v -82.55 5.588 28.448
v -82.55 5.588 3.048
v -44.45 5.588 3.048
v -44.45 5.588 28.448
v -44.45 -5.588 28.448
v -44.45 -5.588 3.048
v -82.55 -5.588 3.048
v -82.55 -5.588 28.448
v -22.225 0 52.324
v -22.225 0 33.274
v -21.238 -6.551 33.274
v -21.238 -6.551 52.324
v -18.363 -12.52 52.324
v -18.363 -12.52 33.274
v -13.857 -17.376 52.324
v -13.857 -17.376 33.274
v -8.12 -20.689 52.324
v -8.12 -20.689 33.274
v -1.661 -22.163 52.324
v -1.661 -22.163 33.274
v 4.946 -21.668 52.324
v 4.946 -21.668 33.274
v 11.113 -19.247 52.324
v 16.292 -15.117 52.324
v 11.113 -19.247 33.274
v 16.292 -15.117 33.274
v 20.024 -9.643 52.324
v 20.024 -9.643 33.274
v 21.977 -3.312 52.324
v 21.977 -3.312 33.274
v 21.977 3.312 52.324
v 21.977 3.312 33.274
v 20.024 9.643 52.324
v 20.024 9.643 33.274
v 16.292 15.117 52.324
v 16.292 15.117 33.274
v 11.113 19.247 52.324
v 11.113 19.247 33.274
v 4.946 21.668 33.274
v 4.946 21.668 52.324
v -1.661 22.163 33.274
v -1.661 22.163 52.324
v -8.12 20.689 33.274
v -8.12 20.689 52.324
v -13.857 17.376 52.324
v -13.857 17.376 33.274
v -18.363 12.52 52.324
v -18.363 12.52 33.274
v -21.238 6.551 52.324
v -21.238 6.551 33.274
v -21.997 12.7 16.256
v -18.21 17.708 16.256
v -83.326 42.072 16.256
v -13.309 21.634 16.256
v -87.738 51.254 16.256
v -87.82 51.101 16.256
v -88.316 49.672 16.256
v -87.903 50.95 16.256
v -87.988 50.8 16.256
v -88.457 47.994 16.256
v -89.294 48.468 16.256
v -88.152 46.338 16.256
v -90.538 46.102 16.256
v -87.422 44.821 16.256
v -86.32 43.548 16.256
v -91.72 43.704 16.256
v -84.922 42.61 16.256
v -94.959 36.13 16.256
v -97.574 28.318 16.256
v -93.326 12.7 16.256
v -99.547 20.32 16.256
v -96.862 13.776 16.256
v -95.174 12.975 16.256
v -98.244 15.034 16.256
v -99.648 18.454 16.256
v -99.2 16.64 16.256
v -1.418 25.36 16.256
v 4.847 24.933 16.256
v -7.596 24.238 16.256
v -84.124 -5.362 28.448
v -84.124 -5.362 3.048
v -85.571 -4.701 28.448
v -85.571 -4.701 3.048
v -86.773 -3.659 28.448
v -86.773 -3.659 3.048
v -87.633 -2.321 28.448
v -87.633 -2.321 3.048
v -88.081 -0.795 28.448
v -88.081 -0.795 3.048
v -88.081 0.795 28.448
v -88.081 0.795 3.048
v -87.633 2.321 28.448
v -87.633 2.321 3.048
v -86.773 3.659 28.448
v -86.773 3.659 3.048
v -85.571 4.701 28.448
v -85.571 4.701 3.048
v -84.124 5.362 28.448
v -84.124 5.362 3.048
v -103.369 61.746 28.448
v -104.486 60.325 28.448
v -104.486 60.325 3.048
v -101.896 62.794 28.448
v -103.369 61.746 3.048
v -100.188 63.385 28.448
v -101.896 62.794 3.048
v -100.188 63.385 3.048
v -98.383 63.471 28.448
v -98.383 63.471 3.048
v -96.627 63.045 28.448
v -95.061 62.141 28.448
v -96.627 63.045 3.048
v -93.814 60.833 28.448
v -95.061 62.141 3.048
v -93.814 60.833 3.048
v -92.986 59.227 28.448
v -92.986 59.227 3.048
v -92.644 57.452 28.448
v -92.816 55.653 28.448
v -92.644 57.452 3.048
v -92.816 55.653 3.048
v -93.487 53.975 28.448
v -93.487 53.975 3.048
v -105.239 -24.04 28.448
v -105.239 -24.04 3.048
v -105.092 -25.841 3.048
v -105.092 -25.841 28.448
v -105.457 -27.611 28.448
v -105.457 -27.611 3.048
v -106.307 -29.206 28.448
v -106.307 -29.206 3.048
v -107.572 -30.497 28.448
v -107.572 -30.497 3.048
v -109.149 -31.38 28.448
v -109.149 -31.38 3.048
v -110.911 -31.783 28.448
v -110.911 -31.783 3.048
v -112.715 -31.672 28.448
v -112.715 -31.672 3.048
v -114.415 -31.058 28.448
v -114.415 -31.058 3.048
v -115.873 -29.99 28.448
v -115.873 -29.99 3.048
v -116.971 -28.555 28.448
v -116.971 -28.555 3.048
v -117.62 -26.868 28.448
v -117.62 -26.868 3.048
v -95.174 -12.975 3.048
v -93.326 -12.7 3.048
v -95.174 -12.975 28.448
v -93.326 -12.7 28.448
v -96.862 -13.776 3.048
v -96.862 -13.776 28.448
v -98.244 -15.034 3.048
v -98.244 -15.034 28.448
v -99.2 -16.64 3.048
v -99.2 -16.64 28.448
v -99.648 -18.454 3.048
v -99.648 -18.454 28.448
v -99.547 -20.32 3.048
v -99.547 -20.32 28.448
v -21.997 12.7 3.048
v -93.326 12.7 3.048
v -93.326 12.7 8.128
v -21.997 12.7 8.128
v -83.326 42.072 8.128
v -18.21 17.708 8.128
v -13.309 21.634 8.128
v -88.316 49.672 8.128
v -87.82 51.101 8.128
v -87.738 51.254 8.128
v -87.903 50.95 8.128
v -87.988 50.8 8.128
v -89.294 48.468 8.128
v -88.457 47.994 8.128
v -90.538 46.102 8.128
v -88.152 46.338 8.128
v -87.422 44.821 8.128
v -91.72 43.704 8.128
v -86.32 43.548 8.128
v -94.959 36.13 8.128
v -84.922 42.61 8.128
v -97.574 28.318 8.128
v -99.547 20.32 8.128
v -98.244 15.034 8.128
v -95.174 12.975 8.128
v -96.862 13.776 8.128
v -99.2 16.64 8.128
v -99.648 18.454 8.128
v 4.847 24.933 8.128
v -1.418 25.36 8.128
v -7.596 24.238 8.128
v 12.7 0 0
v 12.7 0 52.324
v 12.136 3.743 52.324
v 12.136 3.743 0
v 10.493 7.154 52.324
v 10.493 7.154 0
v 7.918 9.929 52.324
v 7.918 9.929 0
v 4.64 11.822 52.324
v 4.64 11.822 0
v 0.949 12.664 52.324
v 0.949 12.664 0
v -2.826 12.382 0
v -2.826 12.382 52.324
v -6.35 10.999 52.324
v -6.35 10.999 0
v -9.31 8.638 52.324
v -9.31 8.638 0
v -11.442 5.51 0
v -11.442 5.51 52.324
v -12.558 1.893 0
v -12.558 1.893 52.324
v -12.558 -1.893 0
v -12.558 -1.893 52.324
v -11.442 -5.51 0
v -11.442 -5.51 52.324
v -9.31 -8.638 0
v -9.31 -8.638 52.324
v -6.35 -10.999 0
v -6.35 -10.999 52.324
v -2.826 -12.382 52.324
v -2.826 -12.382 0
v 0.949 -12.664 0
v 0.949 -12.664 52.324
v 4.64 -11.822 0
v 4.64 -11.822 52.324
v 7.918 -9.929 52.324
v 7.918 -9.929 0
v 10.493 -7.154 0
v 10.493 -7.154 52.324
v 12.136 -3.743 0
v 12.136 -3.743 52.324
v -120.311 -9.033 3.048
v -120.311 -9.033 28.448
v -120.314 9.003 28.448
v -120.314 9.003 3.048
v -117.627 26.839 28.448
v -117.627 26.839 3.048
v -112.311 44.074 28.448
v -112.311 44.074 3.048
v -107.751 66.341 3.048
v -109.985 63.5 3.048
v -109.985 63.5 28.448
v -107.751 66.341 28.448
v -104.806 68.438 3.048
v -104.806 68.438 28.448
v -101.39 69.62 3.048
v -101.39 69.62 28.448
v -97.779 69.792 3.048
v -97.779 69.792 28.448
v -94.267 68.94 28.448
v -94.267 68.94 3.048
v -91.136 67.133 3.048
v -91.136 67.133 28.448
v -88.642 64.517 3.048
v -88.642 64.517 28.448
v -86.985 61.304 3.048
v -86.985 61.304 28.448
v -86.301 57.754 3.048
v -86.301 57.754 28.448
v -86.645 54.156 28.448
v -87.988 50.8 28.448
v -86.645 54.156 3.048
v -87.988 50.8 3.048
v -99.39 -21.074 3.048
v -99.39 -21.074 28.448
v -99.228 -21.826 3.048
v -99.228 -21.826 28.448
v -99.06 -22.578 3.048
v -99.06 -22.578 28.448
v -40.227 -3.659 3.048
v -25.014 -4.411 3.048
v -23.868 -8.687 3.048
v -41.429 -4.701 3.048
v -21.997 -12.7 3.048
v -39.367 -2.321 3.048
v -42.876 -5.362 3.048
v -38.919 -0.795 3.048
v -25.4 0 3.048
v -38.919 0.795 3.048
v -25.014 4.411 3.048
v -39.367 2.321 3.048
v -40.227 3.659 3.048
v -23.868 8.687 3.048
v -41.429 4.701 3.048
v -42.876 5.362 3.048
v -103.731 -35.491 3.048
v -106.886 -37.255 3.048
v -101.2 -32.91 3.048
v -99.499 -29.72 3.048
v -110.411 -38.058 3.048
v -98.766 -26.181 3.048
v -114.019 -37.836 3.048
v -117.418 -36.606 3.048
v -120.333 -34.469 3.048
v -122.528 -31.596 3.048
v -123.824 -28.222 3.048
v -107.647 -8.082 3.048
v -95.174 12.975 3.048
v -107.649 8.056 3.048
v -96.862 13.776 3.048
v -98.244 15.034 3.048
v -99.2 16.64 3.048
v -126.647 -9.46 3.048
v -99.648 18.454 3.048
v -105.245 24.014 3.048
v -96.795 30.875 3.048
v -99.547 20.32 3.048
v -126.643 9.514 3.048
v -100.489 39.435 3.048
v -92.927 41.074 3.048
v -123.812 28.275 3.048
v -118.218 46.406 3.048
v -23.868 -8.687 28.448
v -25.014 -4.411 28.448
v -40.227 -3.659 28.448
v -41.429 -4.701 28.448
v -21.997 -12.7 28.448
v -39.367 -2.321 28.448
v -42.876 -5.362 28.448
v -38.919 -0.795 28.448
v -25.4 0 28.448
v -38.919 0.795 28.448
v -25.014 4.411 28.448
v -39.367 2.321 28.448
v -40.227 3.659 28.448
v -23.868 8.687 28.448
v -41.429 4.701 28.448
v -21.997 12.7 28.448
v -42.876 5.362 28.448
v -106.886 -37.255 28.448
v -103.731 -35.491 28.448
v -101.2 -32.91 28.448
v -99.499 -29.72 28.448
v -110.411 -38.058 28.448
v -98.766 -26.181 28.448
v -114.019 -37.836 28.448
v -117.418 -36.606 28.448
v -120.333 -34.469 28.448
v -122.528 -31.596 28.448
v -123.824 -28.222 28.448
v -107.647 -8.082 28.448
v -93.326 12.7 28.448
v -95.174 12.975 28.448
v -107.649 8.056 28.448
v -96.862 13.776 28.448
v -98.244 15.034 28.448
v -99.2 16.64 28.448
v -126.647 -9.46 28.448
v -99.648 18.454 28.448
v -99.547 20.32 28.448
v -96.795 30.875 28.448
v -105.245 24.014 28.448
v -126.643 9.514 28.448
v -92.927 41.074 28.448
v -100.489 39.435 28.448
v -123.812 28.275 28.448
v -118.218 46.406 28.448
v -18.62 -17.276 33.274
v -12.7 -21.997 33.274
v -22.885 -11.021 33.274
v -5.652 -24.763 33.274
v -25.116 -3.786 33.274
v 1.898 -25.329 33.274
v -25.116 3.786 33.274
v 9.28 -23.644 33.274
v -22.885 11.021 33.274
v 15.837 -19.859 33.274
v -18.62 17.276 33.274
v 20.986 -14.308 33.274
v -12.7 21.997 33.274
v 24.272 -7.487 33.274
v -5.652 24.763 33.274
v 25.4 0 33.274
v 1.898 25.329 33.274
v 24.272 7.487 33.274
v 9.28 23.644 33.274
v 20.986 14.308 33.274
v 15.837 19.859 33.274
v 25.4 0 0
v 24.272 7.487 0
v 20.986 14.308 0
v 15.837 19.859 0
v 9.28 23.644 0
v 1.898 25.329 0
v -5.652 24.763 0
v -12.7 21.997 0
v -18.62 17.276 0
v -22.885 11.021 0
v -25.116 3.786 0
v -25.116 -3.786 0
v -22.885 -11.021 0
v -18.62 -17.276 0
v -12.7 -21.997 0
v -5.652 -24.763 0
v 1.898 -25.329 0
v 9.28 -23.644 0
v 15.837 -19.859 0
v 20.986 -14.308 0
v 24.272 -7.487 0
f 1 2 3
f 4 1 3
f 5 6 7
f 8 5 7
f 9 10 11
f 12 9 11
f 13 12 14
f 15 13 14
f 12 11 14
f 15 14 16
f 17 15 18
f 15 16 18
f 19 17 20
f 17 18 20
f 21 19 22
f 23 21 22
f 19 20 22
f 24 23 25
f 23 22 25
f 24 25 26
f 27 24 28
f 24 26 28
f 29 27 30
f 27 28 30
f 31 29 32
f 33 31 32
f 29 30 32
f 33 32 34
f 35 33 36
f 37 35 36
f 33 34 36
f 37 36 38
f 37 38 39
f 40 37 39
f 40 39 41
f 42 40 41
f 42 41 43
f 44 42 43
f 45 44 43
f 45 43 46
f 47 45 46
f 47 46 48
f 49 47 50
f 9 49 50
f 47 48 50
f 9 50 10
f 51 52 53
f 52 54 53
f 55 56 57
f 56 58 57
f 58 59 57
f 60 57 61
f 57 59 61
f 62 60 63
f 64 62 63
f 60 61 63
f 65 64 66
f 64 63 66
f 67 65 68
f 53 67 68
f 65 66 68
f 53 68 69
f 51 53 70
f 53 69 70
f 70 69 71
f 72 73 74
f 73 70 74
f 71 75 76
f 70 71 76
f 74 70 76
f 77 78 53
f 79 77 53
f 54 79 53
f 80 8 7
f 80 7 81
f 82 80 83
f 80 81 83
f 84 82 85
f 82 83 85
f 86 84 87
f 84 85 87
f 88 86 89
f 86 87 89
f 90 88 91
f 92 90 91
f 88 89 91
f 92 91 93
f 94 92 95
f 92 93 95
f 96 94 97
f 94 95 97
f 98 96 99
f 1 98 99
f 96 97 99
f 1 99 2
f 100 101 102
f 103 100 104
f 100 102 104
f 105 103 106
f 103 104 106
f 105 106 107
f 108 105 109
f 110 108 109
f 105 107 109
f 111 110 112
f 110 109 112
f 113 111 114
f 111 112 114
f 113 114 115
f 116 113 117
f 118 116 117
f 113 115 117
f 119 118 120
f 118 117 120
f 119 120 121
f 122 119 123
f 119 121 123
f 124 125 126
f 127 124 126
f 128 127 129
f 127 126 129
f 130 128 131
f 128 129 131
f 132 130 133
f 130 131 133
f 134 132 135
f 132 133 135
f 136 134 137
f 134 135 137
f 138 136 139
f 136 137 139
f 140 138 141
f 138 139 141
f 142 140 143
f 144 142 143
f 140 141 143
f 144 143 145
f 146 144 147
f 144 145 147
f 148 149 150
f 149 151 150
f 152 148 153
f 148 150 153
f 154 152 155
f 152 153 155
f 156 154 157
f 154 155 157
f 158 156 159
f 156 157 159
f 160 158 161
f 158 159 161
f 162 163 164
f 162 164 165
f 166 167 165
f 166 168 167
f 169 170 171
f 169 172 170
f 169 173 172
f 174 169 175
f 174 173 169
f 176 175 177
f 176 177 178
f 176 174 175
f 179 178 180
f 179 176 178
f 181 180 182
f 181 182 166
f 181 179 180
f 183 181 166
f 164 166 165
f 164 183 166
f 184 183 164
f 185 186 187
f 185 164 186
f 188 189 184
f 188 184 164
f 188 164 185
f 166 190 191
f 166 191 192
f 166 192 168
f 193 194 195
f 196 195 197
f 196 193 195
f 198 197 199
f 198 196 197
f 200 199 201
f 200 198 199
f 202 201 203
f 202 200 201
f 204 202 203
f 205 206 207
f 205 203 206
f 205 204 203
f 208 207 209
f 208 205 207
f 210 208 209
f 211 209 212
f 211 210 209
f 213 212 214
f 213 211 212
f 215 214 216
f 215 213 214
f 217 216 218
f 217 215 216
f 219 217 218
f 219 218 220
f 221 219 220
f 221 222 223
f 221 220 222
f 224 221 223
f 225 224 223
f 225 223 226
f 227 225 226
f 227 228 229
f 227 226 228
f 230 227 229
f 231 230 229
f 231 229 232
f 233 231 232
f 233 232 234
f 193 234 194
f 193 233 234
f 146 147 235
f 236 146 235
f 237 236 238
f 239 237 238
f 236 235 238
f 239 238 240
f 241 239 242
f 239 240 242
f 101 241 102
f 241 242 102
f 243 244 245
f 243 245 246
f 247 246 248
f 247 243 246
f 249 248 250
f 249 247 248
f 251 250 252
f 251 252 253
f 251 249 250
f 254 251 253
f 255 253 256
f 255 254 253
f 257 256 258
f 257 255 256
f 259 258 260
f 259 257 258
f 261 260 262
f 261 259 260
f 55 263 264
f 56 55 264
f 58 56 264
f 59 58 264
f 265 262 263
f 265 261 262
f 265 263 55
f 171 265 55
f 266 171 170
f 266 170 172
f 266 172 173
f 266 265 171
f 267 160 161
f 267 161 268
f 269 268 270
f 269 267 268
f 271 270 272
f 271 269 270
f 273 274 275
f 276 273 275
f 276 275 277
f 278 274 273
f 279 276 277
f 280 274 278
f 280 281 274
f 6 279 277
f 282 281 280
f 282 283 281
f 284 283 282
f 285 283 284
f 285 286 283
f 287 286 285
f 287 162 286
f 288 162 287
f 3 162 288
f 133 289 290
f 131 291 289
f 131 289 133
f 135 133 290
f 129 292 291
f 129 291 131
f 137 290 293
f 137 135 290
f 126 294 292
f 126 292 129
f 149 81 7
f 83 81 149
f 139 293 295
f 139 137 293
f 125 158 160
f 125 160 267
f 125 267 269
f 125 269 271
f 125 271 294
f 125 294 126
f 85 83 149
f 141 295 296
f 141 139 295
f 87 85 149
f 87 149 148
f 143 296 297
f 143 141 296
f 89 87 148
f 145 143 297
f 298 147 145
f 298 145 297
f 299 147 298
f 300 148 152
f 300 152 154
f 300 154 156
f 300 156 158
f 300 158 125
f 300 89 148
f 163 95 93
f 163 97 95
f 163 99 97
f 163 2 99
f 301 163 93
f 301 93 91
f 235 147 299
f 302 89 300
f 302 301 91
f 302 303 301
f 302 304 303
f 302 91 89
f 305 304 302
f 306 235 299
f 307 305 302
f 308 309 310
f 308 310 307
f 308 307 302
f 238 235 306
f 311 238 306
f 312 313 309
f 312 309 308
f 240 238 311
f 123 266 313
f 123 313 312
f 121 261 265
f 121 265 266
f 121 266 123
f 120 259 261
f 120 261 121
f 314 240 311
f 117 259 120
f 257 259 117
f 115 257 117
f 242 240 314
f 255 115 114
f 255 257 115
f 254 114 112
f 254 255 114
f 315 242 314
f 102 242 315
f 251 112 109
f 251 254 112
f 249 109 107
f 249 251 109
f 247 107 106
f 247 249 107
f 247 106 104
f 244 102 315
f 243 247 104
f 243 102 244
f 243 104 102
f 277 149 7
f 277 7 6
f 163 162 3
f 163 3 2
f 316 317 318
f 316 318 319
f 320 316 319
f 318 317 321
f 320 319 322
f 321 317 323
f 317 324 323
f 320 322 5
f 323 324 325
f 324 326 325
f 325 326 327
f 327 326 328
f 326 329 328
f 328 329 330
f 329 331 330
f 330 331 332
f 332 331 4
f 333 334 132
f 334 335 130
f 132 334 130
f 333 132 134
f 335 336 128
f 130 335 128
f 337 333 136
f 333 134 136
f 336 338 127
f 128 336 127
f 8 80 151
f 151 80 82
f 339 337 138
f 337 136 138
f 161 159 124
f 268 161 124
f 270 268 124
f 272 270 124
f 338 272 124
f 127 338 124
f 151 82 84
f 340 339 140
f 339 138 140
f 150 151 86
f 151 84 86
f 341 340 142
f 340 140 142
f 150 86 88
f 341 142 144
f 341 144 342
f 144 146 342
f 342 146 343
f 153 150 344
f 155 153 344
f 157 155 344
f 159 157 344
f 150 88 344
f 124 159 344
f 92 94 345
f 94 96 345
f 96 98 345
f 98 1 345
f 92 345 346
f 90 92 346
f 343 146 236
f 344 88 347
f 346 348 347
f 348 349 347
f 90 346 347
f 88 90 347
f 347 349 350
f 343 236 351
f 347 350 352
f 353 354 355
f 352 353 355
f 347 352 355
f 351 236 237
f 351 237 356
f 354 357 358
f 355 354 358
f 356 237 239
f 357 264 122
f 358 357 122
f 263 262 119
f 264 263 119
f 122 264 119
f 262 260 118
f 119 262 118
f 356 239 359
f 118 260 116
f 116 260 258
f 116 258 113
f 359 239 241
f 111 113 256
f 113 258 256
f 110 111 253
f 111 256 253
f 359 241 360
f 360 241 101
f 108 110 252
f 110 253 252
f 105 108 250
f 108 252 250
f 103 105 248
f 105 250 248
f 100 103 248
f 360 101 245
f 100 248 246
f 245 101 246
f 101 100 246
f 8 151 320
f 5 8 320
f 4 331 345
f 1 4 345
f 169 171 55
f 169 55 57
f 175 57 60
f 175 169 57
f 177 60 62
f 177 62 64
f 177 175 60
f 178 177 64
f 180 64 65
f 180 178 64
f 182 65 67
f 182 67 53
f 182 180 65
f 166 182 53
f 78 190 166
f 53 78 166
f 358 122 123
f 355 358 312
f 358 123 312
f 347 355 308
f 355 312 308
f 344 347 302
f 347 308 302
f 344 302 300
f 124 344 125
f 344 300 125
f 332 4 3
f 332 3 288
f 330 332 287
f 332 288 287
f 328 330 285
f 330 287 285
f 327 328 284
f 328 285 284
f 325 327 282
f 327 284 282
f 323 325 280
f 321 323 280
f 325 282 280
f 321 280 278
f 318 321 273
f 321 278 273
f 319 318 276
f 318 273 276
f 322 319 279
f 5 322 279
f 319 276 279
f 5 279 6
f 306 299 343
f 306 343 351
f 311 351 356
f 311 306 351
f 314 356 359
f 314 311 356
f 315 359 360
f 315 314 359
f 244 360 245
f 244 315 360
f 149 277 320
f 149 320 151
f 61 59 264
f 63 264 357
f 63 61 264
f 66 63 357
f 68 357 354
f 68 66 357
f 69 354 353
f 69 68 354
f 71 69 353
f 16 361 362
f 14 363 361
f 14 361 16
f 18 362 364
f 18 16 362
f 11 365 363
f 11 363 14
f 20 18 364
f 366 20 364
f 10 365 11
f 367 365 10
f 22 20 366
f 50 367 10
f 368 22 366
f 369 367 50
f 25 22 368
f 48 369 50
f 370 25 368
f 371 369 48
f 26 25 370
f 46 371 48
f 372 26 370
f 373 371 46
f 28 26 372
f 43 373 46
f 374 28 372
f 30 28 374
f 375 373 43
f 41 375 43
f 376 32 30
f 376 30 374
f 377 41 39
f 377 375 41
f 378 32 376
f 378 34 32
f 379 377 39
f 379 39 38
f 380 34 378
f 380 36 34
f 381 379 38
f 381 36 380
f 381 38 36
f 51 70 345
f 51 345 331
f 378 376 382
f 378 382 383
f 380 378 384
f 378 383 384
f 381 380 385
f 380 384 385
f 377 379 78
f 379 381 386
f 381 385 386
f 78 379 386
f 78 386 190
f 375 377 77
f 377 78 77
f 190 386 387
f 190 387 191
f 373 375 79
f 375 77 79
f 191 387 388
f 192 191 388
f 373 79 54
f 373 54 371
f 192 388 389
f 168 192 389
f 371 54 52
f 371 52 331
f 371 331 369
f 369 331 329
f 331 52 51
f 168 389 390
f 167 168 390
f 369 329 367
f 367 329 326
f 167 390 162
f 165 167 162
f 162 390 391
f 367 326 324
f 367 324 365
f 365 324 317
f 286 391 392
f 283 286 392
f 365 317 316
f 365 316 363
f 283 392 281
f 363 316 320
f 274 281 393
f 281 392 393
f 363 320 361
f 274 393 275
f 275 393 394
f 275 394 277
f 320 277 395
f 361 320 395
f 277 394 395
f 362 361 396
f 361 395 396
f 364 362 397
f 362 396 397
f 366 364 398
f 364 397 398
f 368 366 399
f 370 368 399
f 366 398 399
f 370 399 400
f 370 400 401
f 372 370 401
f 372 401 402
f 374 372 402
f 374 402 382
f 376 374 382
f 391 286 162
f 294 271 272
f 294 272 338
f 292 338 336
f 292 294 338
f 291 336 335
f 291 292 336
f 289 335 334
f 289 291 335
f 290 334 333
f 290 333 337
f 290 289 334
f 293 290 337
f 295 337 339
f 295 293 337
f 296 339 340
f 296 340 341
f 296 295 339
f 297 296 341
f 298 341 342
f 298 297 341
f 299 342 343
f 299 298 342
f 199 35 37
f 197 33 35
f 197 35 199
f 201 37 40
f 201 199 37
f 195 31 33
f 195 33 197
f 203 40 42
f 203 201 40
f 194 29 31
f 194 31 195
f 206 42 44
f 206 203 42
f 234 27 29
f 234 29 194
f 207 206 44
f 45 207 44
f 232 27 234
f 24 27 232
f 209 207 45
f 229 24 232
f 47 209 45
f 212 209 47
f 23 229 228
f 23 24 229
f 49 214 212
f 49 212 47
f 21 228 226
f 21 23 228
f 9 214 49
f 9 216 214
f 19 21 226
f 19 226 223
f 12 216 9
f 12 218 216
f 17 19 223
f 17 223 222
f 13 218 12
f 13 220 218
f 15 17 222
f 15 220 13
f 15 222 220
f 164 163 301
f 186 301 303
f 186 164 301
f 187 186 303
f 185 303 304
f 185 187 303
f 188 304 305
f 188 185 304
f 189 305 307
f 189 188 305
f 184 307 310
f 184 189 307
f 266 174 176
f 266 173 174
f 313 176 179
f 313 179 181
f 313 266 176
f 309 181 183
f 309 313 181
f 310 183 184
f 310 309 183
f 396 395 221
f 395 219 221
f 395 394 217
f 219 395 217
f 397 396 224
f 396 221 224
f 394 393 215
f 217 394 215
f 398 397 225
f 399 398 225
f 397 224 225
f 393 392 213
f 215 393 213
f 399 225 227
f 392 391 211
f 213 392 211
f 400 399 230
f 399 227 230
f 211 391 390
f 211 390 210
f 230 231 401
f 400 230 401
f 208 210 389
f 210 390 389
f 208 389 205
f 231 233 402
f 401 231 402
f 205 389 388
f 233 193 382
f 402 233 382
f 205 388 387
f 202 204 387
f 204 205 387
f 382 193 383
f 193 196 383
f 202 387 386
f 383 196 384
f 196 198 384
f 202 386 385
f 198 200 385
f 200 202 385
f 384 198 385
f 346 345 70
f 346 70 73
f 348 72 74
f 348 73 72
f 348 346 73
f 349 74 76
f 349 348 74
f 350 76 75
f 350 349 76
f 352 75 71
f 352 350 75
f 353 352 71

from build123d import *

# Parameters (mm, degrees)
SKETCH1_R           = 25.4
BOSS_EXTRUDE1_DEPTH = 33.274
SKETCH2_R           = 22.225
BOSS_EXTRUDE2_DEPTH = 19.05
SKETCH3_R           = 12.7
CUT_EXTRUDE2_DEPTH  = 64.467479673
BOSS_EXTRUDE3_DEPTH = 25.4
FILLET1_R           = 6.35
FILLET2_R           = 6.35
CUT_EXTRUDE3_DEPTH  = 154.088688922
BOSS_EXTRUDE4_DEPTH = 8.128
FILLET3_R           = 6.35


with BuildPart() as part:
    # Sketch1 → Boss-Extrude1 (new body)
    with BuildSketch(Plane.XY):
        Circle(SKETCH1_R)
    extrude(amount=BOSS_EXTRUDE1_DEPTH)

    # Sketch2 → Boss-Extrude2 (add)
    with BuildSketch(Plane.XY.offset(33.274)):
        with Locations(Location((0, 0, 0), (0, 0, 180))):
            Circle(SKETCH2_R)
    extrude(amount=BOSS_EXTRUDE2_DEPTH)

    # Sketch3 → Cut-Extrude2 (cut, through all)
    with BuildSketch(Plane.XY):
        Circle(SKETCH3_R)
    extrude(amount=CUT_EXTRUDE2_DEPTH, mode=Mode.SUBTRACT)

    # Sketch5 → Boss-Extrude3 (add)
    with BuildSketch(Plane(origin=(0, 0, 3.048), x_dir=(-1, 0, 0), z_dir=(0, 0, -1))):
        with BuildLine():
            Line((100.803124952, 12.7), (21.997045256, 12.7))
            ThreePointArc((21.997045256, 12.7), (24.534515988, 6.574003746), (25.4, 0))
            ThreePointArc((25.4, 0), (24.534515988, -6.574003746), (21.997045256, -12.7))
            Line((21.997045256, -12.7), (100.803124952, -12.7))
            ThreePointArc((100.803124952, -12.7), (100.053333913, -17.660418251), (99.059597973, -22.577777778))
            ThreePointArc((99.059597973, -22.577777778), (108.619825498, -37.782449747), (123.824497467, -28.222222222))
            ThreePointArc((123.824497467, -28.222222222), (125.578613792, 18.9476056), (109.985226281, 63.5))
            ThreePointArc((109.985226281, 63.5), (92.636703653, 68.148522628), (87.988181024, 50.8))
            ThreePointArc((87.988181024, 50.8), (96.298711326, 32.390094118), (100.803124952, 12.7))
        make_face()
    extrude(amount=-BOSS_EXTRUDE3_DEPTH)

    # Fillet1
    fillet1_edges = [part.edges().sort_by_distance(p)[0] for p in [
        (-100.803124952, 12.7, 15.748),
    ]]
    fillet(fillet1_edges, radius=FILLET1_R)

    # Fillet2
    fillet2_edges = [part.edges().sort_by_distance(p)[0] for p in [
        (-100.803124952, -12.7, 15.748),
    ]]
    fillet(fillet2_edges, radius=FILLET2_R)

    # Sketch6 → Cut-Extrude3 (cut, through all)
    with BuildSketch(Plane(origin=(0, 0, 3.048), x_dir=(-1, 0, 0), z_dir=(0, 0, -1))):
        with BuildLine():
            Line((44.45, -5.588), (82.55, -5.588))
            ThreePointArc((82.55, -5.588), (88.138, 0), (82.55, 5.588))
            Line((82.55, 5.588), (44.45, 5.588))
            ThreePointArc((44.45, 5.588), (38.862, 0), (44.45, -5.588))
        make_face()
        with BuildLine():
            ThreePointArc((117.620316517, -26.867892407), (119.3040242, 17.971430377), (104.485964967, 60.325))
            ThreePointArc((104.485964967, 60.325), (95.811703653, 62.649261314), (93.487442339, 53.975))
            ThreePointArc((93.487442339, 53.975), (106.745705863, 16.079700863), (105.239230568, -24.039693207))
            ThreePointArc((105.239230568, -24.039693207), (110.015673942, -31.644335781), (117.620316517, -26.867892407))
        make_face()
    extrude(amount=-CUT_EXTRUDE3_DEPTH, mode=Mode.SUBTRACT)

    # Sketch7 → Boss-Extrude4 (add)
    with BuildSketch(Plane.XY.offset(8.128)):
        with BuildLine():
            Line((-93.3255592, 12.7), (-21.997045256, 12.7))
            ThreePointArc((-21.997045256, 12.7), (-10.533208363, 23.11301628), (4.846548483, 24.93333046))
            Line((4.846548483, 24.93333046), (-91.719825153, 43.703932019))
            ThreePointArc((-91.719825153, 43.703932019), (-96.345611399, 32.250320373), (-99.547263147, 20.32))
            ThreePointArc((-99.547263147, 20.32), (-98.24424805, 15.033907372), (-93.3255592, 12.7))
        make_face()
    extrude(amount=BOSS_EXTRUDE4_DEPTH)

    # Fillet3
    # the kernel refuses this fillet: 6.35 mm, written as the material it adds along each edge
    with BuildSketch(Plane(origin=(-91.719825153, 43.703932019, 8.128), x_dir=(0.4664648604868203, 0.8845397299901295, 0), z_dir=(0, 0, 1))) as fillet3_piece_1:
        with BuildLine():
            CenterArc((8.551066202, -6.349980485), FILLET3_R, 90.142046539, 106.663020028)
            Line((2.472249714, -8.185869942), (1.864368065, -8.369458888))
            Line((1.864368065, -8.369458888), (-0.607881649, -0.183588946))
            Line((-0.607881649, -0.183588946), (-0.02578882, 0.634476112))
            ThreePointArc((-0.02578882, 0.634476112), (8.041755062, 0.643812976), (8.533749149, 0.634998049))
            Line((8.533749149, 0.634998049), (8.535323427, 0))
        make_face()
    extrude(amount=8.128)


solid = part.part
